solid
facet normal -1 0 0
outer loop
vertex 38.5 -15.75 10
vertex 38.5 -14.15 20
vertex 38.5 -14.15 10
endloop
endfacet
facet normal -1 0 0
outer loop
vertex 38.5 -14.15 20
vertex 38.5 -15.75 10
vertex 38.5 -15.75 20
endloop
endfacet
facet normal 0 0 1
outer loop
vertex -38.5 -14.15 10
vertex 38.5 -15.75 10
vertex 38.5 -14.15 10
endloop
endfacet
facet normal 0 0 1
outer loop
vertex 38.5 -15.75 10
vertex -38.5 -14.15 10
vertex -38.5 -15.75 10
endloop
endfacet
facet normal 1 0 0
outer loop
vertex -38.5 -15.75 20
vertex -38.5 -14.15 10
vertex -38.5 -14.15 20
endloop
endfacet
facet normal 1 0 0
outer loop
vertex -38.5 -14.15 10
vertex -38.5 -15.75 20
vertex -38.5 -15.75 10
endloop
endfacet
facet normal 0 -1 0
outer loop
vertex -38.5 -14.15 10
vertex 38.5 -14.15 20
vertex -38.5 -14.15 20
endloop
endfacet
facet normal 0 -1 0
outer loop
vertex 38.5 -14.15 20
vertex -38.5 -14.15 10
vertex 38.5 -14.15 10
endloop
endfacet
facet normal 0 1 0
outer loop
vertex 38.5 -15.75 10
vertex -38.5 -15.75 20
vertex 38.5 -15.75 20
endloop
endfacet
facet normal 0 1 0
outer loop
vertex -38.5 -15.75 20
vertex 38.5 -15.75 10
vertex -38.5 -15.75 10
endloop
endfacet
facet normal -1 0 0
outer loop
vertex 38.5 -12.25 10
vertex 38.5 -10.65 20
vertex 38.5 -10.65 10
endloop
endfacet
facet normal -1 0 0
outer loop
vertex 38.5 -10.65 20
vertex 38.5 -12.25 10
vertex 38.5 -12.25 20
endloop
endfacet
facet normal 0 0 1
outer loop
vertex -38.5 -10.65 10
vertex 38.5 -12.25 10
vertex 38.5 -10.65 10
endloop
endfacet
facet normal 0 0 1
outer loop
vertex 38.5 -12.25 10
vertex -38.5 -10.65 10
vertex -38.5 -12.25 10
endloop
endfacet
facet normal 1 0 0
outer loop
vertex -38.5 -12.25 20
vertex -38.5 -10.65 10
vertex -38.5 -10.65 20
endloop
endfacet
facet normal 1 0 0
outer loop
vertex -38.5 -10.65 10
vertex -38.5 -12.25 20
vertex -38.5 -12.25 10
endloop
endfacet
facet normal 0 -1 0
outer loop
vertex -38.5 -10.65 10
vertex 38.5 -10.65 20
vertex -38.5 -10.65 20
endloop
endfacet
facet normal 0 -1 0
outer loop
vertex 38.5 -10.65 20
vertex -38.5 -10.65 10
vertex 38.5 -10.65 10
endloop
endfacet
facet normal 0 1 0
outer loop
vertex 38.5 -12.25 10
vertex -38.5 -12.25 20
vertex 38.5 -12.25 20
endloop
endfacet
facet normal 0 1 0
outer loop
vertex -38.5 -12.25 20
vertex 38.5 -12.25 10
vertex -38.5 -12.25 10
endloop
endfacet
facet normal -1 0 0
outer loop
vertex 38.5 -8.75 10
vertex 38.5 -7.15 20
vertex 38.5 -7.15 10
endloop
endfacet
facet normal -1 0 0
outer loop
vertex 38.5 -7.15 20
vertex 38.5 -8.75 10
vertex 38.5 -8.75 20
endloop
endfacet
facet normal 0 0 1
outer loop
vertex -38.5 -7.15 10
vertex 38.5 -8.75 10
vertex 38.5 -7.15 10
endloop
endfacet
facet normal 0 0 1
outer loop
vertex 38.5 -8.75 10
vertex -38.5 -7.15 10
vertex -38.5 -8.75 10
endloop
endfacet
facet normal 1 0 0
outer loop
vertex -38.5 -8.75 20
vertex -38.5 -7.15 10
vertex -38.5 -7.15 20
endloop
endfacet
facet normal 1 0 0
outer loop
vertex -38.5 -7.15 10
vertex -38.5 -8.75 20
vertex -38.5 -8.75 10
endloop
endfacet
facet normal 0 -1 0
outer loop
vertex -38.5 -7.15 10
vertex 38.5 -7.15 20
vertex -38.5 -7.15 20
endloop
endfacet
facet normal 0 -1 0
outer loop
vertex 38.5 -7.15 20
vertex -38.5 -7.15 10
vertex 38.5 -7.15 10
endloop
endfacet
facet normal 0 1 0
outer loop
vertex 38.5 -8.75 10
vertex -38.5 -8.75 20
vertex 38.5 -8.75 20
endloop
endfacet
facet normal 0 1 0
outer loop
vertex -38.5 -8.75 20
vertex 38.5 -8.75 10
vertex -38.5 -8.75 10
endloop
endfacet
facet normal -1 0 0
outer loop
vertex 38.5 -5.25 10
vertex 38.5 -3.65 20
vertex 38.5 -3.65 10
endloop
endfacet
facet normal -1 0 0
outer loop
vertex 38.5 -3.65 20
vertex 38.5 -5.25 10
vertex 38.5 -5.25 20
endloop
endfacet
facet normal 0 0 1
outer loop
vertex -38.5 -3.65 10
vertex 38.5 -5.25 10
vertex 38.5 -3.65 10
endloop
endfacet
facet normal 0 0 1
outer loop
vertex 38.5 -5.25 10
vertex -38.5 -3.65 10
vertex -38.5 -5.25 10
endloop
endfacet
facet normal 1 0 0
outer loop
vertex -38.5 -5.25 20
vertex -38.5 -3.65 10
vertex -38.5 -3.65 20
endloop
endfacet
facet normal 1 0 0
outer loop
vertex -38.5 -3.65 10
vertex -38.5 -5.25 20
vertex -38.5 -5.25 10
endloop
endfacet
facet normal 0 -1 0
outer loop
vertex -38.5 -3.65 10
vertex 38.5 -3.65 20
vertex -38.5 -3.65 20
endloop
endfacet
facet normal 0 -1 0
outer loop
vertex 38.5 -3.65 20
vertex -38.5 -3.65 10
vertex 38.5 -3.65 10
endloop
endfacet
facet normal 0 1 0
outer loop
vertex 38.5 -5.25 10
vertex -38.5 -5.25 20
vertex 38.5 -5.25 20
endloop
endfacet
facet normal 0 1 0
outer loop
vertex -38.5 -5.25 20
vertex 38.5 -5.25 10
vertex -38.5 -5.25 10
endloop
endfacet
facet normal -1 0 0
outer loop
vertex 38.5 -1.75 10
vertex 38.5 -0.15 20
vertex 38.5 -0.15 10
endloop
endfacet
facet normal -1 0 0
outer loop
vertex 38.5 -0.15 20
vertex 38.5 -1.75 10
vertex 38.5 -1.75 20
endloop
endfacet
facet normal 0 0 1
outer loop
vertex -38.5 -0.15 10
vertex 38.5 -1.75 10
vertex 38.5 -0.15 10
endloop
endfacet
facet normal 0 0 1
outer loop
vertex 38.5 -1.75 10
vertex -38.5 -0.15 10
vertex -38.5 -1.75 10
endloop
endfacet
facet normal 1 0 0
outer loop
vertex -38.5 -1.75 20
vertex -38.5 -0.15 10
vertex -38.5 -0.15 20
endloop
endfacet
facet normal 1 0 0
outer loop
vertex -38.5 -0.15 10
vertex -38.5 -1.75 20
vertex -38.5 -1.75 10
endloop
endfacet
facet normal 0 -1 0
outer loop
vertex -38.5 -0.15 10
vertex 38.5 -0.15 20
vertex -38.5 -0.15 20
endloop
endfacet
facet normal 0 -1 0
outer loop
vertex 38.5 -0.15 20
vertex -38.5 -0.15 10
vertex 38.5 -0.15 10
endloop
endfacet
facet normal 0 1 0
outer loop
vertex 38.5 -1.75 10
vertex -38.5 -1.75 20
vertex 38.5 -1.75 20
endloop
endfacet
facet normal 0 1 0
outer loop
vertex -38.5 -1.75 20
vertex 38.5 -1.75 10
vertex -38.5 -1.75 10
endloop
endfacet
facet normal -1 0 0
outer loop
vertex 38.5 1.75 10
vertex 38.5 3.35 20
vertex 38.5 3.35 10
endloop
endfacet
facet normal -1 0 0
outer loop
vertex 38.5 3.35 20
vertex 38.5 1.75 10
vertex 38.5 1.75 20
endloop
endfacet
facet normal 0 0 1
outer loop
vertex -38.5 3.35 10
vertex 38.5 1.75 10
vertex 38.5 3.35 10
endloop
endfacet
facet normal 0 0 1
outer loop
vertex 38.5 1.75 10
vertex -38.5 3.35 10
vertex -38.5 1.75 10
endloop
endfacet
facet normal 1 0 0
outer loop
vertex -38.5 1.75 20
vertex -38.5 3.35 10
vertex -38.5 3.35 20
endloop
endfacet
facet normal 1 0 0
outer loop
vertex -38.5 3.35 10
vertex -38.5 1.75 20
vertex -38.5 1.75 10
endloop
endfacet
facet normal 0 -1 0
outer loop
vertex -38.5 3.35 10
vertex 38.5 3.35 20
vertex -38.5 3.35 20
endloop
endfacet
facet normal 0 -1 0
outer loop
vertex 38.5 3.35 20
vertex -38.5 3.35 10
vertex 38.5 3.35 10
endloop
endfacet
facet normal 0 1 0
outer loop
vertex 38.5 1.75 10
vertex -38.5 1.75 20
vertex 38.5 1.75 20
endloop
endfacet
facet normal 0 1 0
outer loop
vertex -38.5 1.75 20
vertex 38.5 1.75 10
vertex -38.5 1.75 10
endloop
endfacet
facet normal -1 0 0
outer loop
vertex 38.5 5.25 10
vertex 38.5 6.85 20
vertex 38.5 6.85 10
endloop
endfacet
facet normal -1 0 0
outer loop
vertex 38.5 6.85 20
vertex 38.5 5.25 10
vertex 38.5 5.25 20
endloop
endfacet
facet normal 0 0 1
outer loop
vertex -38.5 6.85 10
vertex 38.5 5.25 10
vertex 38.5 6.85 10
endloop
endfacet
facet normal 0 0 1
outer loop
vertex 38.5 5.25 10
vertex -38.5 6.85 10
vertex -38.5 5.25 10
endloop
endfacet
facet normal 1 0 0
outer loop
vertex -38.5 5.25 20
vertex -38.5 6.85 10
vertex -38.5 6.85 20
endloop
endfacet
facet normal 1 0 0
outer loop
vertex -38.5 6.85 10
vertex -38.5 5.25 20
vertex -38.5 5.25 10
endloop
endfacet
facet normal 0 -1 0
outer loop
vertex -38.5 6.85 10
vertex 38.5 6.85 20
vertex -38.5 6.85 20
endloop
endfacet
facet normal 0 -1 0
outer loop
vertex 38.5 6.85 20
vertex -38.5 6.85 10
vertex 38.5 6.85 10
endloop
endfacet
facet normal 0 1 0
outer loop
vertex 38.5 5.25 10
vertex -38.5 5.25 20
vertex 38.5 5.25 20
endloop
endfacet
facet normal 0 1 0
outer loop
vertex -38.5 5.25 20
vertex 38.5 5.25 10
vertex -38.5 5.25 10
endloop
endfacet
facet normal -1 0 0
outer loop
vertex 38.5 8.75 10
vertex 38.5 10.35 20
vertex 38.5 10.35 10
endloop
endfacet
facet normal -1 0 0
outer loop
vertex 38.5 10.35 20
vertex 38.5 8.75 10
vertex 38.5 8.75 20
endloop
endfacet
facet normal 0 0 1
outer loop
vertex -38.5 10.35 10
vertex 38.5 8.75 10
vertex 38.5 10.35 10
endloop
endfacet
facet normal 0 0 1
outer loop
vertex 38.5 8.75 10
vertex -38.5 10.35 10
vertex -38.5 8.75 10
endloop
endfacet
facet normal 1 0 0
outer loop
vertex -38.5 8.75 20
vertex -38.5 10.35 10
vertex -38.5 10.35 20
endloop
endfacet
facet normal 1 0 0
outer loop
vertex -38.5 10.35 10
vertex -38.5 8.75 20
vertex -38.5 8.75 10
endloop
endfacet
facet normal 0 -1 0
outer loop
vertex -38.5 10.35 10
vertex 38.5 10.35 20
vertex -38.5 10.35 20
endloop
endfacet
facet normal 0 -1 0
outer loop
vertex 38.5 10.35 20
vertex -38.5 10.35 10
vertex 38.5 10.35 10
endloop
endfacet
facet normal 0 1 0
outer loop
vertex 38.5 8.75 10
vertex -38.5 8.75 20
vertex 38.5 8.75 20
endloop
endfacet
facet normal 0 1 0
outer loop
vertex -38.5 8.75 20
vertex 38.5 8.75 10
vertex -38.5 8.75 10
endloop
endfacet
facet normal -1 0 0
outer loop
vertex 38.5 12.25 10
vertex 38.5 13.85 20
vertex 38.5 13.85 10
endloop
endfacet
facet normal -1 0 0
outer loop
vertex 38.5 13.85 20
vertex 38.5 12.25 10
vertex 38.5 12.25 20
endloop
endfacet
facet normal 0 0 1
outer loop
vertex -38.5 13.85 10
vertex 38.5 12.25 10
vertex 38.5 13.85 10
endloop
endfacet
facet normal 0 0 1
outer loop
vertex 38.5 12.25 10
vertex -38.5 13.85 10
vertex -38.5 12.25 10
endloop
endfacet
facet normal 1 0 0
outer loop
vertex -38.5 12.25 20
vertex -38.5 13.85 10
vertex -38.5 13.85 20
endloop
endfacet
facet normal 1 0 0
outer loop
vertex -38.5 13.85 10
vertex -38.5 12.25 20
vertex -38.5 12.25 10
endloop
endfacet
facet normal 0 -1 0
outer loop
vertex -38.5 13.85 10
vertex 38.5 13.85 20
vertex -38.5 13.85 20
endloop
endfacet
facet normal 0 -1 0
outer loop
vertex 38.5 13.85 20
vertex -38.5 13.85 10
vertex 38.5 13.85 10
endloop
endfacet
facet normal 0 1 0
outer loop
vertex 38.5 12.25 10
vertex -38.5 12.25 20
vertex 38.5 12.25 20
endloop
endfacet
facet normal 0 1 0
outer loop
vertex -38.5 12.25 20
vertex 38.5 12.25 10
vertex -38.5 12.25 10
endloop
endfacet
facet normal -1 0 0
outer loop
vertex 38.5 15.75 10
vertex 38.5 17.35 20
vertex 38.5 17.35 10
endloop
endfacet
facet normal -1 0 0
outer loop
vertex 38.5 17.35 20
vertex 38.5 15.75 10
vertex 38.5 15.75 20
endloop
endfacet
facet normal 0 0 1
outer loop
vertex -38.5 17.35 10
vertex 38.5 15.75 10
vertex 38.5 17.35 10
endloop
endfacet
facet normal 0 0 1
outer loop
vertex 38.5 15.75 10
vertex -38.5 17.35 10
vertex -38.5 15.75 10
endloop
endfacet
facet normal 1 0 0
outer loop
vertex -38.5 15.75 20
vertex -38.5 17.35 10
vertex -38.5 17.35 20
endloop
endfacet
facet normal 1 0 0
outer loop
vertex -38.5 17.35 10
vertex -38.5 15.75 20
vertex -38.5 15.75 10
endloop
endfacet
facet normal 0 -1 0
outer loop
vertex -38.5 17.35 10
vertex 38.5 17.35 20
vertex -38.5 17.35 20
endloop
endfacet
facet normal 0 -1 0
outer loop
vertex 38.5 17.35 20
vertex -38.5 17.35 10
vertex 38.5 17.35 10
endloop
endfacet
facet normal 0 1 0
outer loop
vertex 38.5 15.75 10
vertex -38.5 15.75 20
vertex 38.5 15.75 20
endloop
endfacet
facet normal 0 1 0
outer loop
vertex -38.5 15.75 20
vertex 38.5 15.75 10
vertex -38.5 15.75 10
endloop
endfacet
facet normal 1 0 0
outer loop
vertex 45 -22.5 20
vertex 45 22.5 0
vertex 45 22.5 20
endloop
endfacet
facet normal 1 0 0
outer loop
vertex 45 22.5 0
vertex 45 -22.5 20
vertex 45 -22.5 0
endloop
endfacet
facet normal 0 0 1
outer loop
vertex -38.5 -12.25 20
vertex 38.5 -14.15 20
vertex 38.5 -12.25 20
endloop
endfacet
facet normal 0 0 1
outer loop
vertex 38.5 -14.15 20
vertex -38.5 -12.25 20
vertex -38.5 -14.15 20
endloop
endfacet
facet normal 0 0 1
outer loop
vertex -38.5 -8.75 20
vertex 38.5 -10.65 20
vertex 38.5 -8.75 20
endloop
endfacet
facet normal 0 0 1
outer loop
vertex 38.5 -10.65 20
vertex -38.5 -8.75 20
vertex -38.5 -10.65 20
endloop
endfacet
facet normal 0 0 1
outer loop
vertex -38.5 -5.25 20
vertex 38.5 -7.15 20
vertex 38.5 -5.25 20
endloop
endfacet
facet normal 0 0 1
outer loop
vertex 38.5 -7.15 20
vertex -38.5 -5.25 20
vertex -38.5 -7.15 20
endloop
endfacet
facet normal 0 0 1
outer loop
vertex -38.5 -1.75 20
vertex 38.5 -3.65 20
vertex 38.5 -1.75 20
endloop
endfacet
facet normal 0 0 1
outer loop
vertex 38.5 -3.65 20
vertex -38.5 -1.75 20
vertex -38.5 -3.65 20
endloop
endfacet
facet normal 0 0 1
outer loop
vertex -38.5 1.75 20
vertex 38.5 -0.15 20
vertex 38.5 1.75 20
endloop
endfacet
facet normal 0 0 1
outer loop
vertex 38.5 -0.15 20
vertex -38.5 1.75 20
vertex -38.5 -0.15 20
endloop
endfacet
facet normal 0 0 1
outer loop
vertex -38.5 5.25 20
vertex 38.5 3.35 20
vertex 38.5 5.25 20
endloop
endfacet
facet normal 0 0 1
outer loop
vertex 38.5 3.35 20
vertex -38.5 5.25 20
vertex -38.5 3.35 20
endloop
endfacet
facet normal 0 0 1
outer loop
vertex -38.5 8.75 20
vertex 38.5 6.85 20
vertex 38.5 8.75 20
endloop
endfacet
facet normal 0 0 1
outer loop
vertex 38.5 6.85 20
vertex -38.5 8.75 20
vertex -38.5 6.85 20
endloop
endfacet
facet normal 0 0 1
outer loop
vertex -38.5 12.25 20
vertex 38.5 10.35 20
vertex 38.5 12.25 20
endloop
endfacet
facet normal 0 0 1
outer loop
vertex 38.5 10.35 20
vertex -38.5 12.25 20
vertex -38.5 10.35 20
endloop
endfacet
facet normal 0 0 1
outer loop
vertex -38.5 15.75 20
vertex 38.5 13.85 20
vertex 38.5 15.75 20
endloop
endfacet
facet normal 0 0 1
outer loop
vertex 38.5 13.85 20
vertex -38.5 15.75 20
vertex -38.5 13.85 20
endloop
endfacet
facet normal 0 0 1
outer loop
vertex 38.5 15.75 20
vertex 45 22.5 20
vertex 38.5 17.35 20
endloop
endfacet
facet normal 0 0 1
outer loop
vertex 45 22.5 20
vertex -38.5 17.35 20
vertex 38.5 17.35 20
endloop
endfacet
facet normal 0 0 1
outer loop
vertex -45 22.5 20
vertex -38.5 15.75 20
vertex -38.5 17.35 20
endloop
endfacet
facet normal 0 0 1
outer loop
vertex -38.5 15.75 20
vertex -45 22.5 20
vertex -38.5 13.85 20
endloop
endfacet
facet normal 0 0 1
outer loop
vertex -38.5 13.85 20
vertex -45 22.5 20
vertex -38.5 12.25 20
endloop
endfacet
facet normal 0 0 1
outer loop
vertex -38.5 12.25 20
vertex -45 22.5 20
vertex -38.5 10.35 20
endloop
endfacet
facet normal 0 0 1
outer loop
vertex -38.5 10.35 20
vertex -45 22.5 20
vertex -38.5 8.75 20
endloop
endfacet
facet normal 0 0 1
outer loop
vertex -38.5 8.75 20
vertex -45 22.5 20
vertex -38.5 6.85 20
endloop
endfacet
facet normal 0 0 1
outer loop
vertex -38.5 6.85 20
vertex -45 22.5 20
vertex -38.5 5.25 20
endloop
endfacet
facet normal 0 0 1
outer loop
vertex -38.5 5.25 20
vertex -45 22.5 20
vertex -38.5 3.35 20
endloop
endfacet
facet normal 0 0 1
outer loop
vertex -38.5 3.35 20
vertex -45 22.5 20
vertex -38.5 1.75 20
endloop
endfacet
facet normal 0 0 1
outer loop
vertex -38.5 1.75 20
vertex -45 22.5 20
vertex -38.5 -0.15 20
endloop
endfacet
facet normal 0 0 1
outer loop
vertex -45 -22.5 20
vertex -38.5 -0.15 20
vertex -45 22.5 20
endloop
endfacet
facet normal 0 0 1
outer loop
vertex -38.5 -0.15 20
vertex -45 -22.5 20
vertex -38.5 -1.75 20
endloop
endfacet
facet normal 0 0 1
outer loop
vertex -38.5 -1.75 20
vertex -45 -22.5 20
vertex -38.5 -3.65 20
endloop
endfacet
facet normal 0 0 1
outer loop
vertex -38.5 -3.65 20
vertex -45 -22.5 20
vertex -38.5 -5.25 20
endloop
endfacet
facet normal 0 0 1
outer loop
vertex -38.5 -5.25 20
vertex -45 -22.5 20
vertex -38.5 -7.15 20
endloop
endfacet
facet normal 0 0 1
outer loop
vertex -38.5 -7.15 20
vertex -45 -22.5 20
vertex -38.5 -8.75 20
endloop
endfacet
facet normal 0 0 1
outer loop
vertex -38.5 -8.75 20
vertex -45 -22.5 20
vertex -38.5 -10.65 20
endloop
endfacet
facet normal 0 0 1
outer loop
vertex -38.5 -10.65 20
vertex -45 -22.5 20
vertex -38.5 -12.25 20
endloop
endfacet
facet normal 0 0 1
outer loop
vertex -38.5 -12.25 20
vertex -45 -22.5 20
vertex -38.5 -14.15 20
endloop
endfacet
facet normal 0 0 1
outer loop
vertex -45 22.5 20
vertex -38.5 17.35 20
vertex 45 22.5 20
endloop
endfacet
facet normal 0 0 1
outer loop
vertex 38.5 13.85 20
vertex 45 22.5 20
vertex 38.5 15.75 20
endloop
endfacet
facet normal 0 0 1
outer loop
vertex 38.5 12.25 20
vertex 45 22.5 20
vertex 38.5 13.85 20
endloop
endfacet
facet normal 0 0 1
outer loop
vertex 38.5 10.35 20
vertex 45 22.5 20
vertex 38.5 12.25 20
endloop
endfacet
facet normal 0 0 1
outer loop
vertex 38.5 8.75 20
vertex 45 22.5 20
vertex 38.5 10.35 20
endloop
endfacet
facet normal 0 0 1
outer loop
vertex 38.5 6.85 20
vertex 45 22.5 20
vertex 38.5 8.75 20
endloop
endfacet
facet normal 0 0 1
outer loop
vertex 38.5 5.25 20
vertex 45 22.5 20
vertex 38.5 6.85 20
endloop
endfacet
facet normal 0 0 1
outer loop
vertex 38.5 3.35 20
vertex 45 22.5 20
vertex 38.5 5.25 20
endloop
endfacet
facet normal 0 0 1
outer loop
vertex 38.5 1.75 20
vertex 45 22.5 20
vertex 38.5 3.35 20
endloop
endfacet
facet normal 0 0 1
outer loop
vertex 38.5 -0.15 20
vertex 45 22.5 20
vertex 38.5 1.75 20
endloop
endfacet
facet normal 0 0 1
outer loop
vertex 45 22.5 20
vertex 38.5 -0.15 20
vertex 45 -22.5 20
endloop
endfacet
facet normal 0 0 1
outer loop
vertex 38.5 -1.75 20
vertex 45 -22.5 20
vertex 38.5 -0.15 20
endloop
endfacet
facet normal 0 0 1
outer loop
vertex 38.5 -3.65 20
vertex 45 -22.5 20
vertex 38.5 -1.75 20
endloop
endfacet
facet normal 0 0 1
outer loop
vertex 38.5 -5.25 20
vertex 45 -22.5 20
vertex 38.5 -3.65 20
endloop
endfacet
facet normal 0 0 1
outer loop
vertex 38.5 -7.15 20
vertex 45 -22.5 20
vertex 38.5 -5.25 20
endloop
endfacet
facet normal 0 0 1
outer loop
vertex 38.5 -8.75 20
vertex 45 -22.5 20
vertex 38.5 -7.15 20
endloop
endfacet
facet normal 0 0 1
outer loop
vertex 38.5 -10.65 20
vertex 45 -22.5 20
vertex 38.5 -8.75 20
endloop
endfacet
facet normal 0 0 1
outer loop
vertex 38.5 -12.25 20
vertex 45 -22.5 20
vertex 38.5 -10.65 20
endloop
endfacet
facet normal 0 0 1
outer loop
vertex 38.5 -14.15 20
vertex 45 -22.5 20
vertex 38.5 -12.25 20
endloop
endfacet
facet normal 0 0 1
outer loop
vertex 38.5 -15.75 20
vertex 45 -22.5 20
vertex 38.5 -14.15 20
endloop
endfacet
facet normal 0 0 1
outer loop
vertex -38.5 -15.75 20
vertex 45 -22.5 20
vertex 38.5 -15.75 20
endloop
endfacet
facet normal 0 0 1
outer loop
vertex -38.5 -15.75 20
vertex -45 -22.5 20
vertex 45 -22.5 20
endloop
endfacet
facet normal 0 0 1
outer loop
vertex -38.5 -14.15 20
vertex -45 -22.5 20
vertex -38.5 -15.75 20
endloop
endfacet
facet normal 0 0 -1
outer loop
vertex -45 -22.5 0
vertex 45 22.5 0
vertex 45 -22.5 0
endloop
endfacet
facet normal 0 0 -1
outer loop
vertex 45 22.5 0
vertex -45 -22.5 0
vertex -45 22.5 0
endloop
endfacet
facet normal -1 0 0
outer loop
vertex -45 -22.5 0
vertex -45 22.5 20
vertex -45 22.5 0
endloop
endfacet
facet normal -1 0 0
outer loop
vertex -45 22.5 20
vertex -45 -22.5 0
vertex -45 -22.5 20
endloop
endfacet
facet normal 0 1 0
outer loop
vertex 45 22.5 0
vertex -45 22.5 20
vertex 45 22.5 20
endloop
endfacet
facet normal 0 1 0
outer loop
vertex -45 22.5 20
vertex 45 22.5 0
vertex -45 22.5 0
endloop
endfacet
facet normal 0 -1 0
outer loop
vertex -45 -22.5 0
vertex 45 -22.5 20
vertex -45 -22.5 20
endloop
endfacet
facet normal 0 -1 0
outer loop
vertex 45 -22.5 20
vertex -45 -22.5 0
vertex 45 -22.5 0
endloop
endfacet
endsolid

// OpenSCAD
// Slide drying rack - holds 10 microscope slides upright on their long edge
// Print orientation: base block on the bed (z = 0), slots open upward (+Z)

// ---------------- Parameters ----------------
block_len    = 90;    // base block length along X (mm)
block_wid    = 45;    // base block width along Y (mm)
block_ht     = 20;    // base block height along Z (mm)

slot_count   = 10;    // number of slide slots
slot_len     = 77;    // slot length along X (mm)
slot_wid     = 1.6;   // slot width along Y (mm)
slot_depth   = 10;    // slot depth from top face (mm)
slot_pitch   = 3.5;   // centre-to-centre spacing of slots in Y (mm)

eps          = 0.5;   // overshoot so cutters pass through the top face (mm)

$fn = 64;

// ---------------- Model ----------------
difference() {
    // Base block, centred in X and Y, sitting on z = 0
    translate([-block_len/2, -block_wid/2, 0])
        cube([block_len, block_wid, block_ht]);

    // Row of parallel slots, centred on the block in X and Y
    for (i = [0 : slot_count - 1]) {
        y = (i - (slot_count - 1)/2) * slot_pitch;
        translate([-slot_len/2, y, block_ht - slot_depth])
            cube([slot_len, slot_wid, slot_depth + eps]);
    }
}
